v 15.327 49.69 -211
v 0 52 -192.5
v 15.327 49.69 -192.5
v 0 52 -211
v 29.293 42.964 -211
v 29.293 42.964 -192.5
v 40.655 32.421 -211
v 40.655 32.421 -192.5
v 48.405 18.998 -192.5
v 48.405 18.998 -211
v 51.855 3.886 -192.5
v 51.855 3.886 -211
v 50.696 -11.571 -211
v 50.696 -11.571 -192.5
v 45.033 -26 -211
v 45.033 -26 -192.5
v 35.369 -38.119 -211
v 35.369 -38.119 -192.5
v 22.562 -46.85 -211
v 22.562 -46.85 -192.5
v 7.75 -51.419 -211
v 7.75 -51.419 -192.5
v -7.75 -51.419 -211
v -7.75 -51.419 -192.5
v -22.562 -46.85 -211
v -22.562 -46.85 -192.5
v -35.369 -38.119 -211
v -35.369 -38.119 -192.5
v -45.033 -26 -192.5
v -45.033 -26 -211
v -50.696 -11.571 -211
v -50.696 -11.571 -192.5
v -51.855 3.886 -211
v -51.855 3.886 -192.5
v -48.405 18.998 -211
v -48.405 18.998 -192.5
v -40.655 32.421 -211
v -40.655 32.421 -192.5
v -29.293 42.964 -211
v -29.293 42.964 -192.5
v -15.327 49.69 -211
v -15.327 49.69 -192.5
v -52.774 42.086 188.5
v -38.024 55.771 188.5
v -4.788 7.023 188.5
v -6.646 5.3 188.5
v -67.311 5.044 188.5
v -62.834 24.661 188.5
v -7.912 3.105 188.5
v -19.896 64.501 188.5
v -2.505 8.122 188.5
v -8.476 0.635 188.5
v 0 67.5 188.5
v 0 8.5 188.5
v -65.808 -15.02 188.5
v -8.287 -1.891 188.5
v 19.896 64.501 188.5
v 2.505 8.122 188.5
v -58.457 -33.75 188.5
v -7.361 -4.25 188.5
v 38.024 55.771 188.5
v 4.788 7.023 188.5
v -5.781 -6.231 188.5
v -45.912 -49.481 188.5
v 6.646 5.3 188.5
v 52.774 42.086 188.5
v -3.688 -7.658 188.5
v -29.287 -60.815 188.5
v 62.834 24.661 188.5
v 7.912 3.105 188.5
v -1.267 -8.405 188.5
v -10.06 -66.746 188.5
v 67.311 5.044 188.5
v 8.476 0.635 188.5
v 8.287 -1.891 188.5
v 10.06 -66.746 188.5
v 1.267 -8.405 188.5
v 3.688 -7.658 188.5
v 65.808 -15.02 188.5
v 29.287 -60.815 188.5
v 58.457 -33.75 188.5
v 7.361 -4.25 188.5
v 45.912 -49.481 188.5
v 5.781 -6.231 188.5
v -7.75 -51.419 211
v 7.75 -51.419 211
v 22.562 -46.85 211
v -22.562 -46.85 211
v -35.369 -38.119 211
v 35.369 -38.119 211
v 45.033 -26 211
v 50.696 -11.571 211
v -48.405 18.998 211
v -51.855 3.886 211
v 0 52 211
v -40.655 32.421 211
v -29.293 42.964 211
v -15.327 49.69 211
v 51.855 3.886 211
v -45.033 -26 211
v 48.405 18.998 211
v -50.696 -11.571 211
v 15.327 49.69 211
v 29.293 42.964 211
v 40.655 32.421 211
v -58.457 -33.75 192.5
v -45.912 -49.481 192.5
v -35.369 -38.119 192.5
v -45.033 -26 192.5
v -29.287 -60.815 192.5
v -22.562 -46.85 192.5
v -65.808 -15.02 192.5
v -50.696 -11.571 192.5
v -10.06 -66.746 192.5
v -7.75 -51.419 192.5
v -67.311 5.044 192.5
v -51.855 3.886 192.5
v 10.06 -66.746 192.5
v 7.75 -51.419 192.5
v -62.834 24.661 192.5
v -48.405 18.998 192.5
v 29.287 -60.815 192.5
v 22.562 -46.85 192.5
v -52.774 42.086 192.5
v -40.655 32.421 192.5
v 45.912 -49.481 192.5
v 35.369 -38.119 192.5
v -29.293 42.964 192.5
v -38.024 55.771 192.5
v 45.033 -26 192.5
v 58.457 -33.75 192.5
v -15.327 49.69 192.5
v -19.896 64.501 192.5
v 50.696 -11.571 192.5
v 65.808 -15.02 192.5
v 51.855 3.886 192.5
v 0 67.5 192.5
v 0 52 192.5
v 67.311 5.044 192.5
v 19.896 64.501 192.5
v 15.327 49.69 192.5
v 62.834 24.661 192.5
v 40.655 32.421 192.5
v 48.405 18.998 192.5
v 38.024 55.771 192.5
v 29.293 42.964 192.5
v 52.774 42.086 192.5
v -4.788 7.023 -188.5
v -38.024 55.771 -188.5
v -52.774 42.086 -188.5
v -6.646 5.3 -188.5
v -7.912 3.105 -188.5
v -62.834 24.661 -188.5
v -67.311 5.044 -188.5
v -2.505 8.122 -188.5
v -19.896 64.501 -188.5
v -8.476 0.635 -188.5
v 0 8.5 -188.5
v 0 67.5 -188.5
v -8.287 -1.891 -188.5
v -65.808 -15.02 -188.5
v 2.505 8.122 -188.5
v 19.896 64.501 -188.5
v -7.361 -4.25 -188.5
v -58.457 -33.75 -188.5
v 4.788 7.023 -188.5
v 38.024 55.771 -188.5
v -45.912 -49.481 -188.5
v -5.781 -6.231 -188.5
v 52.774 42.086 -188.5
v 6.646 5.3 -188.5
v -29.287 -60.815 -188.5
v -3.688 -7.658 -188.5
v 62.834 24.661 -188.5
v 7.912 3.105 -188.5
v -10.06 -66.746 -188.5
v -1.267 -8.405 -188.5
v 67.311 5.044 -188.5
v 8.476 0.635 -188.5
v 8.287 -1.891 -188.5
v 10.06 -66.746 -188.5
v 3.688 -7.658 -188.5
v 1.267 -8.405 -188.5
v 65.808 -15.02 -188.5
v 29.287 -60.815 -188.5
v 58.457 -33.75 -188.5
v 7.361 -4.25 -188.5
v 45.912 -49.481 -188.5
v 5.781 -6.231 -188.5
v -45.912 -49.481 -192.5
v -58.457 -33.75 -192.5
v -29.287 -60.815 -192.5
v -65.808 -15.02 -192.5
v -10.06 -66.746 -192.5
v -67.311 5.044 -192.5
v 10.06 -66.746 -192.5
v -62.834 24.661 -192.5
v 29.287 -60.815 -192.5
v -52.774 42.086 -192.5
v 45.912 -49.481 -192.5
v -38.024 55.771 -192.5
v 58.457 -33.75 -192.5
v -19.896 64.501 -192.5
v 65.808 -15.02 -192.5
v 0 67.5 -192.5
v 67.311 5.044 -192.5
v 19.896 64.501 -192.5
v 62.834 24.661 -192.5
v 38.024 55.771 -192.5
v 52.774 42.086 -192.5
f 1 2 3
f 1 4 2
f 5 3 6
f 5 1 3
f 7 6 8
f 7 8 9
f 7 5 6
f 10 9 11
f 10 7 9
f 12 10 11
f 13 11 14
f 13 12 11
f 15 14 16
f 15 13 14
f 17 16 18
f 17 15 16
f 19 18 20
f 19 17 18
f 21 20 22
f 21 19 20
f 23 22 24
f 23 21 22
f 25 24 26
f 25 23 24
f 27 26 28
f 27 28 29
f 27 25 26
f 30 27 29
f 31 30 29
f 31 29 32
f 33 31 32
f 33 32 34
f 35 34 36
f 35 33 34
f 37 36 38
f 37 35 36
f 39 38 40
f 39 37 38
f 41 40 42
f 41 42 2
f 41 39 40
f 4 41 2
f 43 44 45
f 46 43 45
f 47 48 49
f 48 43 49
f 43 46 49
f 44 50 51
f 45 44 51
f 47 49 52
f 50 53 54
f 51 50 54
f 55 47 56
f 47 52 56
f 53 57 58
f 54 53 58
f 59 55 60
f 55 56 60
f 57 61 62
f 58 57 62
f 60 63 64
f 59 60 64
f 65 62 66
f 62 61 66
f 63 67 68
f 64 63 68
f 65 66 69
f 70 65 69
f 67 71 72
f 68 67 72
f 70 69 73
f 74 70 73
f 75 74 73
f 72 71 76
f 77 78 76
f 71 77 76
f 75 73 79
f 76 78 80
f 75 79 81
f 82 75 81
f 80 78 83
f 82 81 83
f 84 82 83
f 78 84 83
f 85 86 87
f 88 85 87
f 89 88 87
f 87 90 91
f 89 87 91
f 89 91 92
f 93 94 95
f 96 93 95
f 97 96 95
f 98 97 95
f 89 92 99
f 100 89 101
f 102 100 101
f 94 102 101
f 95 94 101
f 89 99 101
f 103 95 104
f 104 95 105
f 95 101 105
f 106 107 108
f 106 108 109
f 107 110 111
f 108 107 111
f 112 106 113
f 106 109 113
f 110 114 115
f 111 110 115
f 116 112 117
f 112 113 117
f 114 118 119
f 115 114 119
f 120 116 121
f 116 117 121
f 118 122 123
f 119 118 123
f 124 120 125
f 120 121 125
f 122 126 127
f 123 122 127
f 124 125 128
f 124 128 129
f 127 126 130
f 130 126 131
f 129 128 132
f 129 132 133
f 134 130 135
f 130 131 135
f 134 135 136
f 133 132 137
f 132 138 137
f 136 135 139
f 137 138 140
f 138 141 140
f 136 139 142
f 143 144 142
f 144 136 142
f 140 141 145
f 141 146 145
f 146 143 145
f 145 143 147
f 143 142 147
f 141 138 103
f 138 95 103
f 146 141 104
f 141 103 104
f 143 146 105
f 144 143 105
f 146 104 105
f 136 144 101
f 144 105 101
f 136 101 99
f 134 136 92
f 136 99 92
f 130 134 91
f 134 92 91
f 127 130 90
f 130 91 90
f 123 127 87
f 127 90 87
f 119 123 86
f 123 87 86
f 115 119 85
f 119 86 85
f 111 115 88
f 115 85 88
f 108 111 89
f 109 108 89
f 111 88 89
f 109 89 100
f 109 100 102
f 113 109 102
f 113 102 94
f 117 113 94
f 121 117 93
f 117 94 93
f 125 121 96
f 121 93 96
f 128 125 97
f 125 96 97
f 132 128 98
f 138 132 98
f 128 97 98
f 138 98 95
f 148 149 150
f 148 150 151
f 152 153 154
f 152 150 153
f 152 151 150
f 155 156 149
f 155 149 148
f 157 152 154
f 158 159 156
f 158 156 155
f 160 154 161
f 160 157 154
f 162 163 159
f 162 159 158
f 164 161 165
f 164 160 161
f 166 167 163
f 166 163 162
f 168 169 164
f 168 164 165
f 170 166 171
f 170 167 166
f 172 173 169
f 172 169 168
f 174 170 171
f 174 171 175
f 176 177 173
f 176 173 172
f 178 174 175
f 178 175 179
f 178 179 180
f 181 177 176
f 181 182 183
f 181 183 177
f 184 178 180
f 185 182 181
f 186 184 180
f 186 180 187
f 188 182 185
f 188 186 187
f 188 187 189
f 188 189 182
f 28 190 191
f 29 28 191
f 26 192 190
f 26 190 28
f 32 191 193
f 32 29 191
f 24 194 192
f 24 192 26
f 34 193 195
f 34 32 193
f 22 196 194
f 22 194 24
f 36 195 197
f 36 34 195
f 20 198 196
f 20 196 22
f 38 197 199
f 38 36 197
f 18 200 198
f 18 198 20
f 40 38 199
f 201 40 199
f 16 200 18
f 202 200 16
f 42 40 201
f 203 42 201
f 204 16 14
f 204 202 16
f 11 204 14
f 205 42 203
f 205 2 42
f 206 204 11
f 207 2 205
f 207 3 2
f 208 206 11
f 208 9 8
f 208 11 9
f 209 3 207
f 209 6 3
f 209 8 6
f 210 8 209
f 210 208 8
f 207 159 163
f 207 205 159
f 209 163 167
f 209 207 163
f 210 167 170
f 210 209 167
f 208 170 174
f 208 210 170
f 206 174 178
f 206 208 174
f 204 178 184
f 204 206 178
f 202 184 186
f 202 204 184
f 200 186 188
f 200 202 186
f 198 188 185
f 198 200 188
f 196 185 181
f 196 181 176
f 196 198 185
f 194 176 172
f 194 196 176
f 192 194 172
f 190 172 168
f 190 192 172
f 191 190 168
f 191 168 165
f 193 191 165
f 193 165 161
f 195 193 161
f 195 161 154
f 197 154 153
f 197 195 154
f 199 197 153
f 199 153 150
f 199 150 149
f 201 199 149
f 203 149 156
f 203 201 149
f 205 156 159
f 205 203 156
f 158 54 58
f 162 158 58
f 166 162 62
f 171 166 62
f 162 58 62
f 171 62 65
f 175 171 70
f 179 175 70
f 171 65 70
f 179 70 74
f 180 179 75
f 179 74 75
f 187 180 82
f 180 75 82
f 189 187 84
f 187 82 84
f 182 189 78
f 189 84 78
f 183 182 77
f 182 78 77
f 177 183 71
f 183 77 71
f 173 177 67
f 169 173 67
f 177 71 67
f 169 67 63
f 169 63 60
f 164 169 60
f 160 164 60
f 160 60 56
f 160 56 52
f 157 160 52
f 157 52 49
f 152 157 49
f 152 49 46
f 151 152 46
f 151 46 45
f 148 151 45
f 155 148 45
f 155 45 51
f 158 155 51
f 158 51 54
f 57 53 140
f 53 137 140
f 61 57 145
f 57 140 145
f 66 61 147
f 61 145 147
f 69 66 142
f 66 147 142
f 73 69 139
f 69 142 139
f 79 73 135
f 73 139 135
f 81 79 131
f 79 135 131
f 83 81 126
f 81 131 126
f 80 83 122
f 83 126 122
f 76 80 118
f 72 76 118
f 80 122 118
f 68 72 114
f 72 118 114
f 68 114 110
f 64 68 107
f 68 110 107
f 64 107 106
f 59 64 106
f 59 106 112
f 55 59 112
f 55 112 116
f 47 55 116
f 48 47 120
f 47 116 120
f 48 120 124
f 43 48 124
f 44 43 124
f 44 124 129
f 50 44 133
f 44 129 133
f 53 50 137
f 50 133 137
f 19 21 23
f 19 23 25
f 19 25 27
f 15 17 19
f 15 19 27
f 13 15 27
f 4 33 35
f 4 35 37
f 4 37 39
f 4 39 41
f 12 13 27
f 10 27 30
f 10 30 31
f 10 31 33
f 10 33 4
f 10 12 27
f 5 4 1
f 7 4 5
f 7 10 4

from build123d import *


with BuildPart() as part:
    # Эскиз1 → Повернуть2 (revolve)
    with BuildSketch(Plane(origin=(0, 0, 0), x_dir=(0, 0, -1), z_dir=(1, 0, 0))):
        Polygon((0, 8.5), (188.5, 8.5), (188.5, 67.5), (192.5, 67.5), (192.5, 52), (211, 52), (211, 0), (0, 0), align=None)
    revolve_2 = revolve(axis=Axis((0, 0, 0), (0, 0, -1)))

    # Зеркальное отражение1: Повернуть2 across plane
    add(revolve_2.mirror(Plane(origin=(0, 8.5, 0), x_dir=(1, 0, 0), z_dir=(0, 0, -1))))


solid = part.part
